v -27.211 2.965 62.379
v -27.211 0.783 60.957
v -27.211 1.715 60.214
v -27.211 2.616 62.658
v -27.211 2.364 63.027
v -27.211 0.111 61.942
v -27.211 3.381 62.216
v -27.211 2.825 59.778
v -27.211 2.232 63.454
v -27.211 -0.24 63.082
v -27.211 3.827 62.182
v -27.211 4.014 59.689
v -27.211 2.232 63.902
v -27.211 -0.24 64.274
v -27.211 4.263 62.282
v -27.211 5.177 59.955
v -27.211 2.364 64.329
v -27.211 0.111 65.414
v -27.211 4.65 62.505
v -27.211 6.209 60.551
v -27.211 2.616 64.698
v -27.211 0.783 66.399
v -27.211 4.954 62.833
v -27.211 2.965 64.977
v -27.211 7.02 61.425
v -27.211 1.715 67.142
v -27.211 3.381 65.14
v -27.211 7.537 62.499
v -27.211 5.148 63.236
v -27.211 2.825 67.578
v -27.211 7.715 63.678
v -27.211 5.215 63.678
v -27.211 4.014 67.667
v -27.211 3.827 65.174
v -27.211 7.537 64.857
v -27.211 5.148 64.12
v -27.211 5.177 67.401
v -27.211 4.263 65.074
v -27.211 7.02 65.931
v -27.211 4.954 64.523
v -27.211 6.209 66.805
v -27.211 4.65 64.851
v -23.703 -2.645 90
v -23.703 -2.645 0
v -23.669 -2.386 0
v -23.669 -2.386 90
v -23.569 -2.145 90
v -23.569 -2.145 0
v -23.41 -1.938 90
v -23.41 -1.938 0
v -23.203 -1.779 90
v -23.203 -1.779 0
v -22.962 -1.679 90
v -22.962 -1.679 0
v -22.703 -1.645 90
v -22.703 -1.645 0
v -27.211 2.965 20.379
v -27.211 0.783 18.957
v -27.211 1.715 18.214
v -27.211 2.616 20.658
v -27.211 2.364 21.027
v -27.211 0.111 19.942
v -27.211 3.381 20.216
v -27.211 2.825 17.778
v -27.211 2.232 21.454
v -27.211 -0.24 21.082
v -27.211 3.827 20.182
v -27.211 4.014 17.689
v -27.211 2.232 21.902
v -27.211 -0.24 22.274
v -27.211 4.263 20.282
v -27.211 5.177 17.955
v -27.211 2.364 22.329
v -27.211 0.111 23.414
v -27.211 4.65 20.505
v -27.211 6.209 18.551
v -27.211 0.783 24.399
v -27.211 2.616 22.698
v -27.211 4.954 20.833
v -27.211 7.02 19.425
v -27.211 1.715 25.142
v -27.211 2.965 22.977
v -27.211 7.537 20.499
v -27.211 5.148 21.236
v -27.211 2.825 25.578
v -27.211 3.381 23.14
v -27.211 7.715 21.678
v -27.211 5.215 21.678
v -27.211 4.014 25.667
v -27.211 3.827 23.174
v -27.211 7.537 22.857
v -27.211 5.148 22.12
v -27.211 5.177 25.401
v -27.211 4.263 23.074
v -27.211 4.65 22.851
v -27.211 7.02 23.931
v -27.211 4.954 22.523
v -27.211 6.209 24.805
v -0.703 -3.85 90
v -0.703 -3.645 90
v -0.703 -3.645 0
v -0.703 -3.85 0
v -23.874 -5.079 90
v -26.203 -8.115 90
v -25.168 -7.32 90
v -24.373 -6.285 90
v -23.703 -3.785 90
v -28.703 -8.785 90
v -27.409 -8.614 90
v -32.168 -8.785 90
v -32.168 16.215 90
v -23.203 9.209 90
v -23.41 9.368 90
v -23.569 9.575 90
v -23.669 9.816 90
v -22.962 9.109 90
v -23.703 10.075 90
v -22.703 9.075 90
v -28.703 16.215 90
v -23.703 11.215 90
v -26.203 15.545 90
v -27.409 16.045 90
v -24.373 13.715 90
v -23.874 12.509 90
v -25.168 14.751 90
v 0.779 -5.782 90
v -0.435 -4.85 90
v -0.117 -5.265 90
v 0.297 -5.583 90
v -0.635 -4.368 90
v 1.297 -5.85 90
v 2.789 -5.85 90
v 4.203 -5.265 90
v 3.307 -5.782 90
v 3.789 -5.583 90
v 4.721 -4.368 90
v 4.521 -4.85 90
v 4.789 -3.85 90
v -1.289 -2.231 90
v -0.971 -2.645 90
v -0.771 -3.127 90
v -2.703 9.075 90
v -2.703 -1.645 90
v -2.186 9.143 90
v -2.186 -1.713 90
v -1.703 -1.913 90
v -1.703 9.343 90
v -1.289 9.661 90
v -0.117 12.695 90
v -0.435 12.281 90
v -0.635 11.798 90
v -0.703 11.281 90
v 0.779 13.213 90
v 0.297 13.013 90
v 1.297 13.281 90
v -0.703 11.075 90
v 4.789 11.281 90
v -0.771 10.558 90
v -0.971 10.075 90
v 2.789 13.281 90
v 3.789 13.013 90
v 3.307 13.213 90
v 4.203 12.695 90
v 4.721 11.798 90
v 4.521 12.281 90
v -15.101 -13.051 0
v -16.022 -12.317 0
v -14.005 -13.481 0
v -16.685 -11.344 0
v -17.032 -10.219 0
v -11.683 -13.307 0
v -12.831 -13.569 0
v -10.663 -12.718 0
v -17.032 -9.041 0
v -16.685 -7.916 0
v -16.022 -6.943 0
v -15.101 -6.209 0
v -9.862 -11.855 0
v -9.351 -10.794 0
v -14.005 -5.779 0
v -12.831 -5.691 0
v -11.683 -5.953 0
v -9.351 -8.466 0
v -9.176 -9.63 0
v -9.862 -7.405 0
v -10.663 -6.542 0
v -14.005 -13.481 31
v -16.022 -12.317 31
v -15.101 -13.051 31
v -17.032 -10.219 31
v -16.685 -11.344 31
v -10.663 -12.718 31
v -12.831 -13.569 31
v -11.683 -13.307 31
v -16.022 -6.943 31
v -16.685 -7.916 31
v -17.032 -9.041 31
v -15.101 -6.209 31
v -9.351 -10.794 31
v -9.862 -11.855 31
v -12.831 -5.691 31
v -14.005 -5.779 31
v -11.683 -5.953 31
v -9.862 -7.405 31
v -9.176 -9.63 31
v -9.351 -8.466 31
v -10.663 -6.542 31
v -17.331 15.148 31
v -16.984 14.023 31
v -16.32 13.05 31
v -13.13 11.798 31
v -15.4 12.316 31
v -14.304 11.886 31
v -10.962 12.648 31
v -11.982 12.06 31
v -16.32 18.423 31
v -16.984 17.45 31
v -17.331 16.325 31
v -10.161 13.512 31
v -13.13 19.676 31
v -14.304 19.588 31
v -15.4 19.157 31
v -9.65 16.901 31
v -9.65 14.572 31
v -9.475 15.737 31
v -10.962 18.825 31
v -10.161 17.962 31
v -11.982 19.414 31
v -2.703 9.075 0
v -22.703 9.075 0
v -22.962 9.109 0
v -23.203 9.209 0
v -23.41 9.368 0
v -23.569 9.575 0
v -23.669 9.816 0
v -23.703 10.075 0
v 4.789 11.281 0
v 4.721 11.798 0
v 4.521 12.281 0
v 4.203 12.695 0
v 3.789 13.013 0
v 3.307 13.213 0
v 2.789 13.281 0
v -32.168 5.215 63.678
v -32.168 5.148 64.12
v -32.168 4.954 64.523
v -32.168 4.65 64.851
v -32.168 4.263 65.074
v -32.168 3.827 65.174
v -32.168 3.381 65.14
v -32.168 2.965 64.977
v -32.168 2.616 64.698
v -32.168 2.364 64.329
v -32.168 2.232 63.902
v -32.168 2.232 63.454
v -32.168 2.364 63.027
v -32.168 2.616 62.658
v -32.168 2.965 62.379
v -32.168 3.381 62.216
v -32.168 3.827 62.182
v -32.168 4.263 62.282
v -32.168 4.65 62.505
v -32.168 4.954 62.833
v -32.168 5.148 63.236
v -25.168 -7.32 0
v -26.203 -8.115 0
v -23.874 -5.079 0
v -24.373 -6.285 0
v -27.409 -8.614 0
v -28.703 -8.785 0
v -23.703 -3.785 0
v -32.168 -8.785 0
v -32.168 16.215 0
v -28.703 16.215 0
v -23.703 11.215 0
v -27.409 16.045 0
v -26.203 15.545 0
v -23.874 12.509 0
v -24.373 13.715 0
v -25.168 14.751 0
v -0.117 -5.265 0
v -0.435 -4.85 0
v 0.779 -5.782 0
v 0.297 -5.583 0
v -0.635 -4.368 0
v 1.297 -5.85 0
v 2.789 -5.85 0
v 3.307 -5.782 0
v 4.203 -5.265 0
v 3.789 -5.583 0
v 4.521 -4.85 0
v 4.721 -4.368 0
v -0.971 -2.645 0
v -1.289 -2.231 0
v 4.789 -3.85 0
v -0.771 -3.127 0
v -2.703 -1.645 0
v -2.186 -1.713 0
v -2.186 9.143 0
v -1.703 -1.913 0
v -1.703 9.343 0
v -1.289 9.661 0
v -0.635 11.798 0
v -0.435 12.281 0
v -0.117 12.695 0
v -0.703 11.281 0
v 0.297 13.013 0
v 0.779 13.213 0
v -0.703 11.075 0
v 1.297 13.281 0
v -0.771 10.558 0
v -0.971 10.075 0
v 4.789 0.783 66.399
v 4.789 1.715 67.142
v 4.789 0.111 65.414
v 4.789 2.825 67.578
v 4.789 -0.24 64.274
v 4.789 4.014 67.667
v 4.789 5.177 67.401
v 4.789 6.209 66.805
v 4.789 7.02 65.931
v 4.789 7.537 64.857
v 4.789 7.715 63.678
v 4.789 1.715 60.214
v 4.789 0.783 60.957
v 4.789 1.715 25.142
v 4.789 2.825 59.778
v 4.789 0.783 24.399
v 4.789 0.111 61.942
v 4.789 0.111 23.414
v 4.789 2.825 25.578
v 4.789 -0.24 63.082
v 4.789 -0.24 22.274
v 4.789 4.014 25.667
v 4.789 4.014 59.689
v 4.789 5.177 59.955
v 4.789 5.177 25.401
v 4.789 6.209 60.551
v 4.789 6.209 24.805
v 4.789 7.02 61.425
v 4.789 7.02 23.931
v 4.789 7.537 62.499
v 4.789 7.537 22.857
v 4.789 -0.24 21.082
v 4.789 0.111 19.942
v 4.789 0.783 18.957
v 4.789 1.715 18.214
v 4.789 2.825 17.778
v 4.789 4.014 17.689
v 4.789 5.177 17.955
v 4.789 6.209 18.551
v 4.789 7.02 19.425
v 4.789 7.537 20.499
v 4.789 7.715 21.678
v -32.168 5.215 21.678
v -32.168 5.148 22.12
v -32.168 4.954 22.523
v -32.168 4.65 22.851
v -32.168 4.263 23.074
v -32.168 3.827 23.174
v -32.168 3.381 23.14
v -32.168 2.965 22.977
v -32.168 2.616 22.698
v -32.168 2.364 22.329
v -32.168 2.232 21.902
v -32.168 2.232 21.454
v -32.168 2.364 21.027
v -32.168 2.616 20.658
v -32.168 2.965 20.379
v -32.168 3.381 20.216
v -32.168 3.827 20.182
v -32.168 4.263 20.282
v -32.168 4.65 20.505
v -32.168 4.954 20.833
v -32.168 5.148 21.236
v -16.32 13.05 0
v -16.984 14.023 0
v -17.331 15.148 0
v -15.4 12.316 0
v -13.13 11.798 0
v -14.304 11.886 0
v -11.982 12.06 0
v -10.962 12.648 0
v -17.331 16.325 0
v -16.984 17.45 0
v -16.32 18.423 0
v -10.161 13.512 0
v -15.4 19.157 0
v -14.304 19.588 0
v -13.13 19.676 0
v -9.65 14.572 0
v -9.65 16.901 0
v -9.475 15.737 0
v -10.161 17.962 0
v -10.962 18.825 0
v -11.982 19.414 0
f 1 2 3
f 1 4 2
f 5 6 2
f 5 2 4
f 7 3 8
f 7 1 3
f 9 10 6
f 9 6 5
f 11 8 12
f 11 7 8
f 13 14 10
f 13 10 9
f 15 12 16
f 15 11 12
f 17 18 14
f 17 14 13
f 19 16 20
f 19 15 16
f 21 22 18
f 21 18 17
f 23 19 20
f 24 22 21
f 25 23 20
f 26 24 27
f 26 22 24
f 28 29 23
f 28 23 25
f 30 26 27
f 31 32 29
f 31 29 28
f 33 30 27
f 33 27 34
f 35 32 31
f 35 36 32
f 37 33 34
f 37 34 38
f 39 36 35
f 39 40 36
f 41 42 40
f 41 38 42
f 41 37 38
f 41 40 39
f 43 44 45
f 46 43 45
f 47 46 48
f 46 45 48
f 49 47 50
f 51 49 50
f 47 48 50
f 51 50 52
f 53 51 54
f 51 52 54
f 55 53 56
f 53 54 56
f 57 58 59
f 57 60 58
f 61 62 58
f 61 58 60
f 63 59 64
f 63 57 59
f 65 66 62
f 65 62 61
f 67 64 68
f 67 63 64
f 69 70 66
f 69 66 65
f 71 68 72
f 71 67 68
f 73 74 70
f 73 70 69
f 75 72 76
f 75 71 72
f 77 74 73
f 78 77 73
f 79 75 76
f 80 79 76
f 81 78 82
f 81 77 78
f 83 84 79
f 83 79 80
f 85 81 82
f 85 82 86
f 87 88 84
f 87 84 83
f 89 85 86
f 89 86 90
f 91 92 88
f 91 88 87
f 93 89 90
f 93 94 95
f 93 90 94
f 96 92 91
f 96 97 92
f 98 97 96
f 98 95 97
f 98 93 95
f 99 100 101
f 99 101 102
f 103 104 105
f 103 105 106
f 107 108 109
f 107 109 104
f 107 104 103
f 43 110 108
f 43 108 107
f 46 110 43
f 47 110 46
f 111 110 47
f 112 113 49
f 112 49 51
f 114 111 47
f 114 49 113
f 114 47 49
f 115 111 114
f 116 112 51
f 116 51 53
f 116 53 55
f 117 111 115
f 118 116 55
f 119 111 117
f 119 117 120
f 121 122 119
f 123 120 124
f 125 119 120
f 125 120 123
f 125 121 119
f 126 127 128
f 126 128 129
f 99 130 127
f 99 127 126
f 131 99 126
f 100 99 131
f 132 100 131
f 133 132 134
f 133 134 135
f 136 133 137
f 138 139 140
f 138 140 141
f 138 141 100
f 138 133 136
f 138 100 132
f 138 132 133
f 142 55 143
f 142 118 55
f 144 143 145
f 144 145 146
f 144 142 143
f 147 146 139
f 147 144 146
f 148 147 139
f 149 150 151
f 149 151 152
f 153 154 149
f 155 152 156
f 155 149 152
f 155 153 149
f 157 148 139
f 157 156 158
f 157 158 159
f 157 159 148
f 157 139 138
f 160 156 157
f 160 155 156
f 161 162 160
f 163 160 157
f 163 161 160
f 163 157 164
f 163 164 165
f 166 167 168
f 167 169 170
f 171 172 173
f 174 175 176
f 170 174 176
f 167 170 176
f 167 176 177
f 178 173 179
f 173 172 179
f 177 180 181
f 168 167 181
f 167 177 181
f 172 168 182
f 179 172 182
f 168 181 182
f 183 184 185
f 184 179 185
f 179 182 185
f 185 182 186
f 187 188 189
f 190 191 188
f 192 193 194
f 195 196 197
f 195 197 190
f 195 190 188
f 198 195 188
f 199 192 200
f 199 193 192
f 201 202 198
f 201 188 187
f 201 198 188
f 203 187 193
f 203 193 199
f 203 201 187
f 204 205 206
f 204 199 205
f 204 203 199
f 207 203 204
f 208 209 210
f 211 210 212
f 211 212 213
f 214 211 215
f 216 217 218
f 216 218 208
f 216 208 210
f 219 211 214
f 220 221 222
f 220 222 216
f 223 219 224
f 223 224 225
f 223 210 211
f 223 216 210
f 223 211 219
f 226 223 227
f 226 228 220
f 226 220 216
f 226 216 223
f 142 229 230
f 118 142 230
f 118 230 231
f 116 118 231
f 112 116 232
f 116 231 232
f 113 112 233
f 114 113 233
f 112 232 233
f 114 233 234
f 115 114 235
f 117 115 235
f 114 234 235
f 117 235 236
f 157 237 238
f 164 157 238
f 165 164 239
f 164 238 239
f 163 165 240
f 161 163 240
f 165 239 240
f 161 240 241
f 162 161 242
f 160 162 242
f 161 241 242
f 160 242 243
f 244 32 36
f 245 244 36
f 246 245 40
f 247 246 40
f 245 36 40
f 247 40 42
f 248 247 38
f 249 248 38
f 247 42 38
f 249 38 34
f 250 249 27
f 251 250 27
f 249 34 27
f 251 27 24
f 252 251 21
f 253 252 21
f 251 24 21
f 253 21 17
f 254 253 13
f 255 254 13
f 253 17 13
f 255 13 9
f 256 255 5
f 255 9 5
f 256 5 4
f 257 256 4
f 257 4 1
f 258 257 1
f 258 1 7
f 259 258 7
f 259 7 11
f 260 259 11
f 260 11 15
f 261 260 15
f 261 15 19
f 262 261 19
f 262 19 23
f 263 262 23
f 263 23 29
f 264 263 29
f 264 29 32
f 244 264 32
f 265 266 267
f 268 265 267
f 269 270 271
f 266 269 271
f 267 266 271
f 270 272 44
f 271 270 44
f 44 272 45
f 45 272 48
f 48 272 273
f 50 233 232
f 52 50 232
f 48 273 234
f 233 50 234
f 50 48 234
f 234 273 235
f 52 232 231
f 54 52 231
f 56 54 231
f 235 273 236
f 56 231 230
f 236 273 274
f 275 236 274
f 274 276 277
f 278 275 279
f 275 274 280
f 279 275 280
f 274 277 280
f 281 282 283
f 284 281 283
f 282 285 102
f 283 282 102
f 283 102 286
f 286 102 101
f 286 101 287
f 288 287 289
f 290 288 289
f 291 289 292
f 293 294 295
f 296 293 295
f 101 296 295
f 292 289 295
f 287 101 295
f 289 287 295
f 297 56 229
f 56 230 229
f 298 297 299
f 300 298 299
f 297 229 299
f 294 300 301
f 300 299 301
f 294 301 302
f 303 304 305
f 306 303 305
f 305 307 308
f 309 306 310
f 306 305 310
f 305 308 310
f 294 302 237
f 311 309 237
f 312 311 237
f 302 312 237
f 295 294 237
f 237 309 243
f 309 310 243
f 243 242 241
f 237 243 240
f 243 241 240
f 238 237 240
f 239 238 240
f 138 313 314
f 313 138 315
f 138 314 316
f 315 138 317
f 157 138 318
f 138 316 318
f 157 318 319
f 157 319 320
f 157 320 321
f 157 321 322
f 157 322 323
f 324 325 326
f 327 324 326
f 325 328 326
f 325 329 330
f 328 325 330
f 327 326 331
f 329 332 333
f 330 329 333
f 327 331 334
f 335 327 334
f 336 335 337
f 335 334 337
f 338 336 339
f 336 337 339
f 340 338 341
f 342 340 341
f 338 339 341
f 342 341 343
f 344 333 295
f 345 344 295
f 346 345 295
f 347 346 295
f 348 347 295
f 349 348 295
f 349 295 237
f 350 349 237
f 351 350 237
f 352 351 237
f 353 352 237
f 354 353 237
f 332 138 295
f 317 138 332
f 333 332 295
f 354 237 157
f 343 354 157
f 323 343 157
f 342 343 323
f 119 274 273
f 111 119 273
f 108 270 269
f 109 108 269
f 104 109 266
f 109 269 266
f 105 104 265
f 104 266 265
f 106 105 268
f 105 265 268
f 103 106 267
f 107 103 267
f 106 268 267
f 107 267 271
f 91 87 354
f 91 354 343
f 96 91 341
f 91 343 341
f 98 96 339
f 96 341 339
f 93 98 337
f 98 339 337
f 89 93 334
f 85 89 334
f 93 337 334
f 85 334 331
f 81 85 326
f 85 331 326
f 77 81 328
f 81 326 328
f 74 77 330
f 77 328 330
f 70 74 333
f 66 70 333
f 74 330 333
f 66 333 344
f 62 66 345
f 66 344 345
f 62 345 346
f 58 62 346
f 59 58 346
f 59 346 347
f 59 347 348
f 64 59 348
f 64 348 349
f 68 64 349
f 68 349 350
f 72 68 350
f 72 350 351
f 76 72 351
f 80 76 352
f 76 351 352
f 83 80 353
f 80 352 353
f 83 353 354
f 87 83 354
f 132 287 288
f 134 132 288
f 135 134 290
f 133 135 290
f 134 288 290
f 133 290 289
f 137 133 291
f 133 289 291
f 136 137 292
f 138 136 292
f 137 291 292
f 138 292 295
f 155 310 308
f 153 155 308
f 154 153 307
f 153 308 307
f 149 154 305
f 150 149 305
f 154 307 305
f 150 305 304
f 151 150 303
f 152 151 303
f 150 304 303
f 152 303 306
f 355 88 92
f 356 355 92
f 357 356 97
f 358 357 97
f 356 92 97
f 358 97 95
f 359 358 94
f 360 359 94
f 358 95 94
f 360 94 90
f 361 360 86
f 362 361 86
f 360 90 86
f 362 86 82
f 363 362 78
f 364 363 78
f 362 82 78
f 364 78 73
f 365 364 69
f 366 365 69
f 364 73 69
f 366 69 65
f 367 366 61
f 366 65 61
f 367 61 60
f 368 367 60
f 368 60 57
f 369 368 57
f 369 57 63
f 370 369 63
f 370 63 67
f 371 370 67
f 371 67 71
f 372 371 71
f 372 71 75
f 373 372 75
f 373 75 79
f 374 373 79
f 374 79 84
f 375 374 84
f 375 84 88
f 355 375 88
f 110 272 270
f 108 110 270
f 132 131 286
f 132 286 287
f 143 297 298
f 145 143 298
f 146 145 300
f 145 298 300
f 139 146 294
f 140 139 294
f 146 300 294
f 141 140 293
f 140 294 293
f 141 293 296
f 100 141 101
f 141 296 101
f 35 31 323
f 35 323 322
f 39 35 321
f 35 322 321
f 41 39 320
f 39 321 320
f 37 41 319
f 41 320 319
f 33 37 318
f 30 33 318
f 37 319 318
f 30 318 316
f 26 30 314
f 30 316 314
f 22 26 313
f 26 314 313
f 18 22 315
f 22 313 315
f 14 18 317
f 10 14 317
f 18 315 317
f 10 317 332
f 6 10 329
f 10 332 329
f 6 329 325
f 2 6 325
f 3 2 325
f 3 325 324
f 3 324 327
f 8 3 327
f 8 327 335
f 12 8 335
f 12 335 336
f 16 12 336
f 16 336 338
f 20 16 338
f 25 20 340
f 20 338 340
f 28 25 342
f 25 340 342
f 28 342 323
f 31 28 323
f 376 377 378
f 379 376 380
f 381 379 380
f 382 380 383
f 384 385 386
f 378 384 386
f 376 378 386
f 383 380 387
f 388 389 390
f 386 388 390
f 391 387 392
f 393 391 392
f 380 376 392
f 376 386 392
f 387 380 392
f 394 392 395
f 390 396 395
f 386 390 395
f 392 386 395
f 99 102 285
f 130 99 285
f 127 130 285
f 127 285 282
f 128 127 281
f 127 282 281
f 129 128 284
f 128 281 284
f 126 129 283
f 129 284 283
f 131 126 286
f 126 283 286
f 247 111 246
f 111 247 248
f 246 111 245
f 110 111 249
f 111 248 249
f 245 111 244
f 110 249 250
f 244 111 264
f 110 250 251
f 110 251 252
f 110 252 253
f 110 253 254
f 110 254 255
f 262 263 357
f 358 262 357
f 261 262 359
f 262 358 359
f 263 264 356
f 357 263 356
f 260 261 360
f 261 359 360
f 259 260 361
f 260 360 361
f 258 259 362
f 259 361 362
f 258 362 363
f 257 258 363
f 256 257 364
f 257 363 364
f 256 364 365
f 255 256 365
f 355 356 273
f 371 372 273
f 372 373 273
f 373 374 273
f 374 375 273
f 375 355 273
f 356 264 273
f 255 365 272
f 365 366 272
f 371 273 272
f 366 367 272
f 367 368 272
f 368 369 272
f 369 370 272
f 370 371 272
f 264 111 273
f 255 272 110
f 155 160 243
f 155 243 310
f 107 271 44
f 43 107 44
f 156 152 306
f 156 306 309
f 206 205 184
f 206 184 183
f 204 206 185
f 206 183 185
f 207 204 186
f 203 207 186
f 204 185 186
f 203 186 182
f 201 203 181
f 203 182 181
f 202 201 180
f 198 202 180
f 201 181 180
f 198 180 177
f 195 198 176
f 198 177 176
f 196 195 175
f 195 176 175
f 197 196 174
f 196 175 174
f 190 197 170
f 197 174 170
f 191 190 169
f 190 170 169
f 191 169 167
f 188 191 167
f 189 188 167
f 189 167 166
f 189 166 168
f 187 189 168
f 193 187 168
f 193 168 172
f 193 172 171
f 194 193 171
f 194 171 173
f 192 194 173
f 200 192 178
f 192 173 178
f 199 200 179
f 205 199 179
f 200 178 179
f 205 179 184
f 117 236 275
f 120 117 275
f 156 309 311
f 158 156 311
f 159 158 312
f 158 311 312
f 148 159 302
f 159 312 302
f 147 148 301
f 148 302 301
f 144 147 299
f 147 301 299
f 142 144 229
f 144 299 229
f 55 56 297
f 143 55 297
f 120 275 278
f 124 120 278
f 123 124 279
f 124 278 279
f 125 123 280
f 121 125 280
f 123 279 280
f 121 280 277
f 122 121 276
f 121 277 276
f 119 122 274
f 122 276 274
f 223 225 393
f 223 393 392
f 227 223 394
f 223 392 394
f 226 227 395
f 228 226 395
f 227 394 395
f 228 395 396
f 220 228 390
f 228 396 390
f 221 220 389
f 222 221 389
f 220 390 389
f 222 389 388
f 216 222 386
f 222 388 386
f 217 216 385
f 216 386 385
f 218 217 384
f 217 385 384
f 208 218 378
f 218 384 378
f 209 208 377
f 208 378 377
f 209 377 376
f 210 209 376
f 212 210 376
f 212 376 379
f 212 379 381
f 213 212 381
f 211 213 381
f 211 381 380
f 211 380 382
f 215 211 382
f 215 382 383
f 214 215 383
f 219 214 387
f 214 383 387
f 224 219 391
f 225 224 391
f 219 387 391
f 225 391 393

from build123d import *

# Parameters (mm, degrees)
F1_DEPTH = 90
F2_DEPTH = 90
F3_R     = 1.5
F4_DEPTH = 54
F3_R_2   = 4
F5_DEPTH = 32
F6_R     = 3.95
F7_DEPTH = 31


with BuildPart() as f1:
    # F0 (on Top) → F1 (new body)
    with BuildSketch(Plane.XY):
        with BuildLine():
            Line((-32.1680851899, 16.2151374258), (-32.1680851899, -8.7848625742))
            Line((-32.1680851899, -8.7848625742), (-28.7031954581, -8.7848625742))
            ThreePointArc((-28.7031954581, -8.7848625742), (-25.1676615522, -7.3203964801), (-23.7031954581, -3.7848625742))
            Line((-23.7031954581, -3.7848625742), (-23.7031954581, -2.6450291778))
            ThreePointArc((-23.7031954581, -2.6450291778), (-23.4103022393, -1.9379223966), (-22.7031954581, -1.6450291778))
            Line((-22.7031954581, -1.6450291778), (-2.7031954581, -1.6450291778))
            ThreePointArc((-2.7031954581, -1.6450291778), (-1.2889818958, -2.2308156154), (-0.7031954581, -3.6450291778))
            Line((-0.7031954581, -3.6450291778), (-0.7031954581, -3.8504671592))
            ThreePointArc((-0.7031954581, -3.8504671592), (-0.1174090205, -5.2646807216), (1.2968045419, -5.8504671592))
            Line((1.2968045419, -5.8504671592), (2.7889119339, -5.8504671592))
            ThreePointArc((2.7889119339, -5.8504671592), (4.2031254963, -5.2646807216), (4.7889119339, -3.8504671592))
            Line((4.7889119339, -3.8504671592), (4.7889119339, 3.7151374258))
            Line((4.7889119339, 3.7151374258), (4.7889119339, 11.2807420108))
            ThreePointArc((4.7889119339, 11.2807420108), (4.2031254963, 12.6949555732), (2.7889119339, 13.2807420108))
            Line((2.7889119339, 13.2807420108), (1.2968045419, 13.2807420108))
            ThreePointArc((1.2968045419, 13.2807420108), (-0.1174090205, 12.6949555732), (-0.7031954581, 11.2807420108))
            Line((-0.7031954581, 11.2807420108), (-0.7031954581, 11.0753040294))
            ThreePointArc((-0.7031954581, 11.0753040294), (-1.2889818958, 9.661090467), (-2.7031954581, 9.0753040294))
            Line((-2.7031954581, 9.0753040294), (-22.7031954581, 9.0753040294))
            ThreePointArc((-22.7031954581, 9.0753040294), (-23.4103022393, 9.3681972482), (-23.7031954581, 10.0753040294))
            Line((-23.7031954581, 10.0753040294), (-23.7031954581, 11.2151374258))
            ThreePointArc((-23.7031954581, 11.2151374258), (-25.1676615522, 14.7506713317), (-28.7031954581, 16.2151374258))
            Line((-28.7031954581, 16.2151374258), (-32.1680851899, 16.2151374258))
        make_face()
    extrude(amount=F1_DEPTH)

    # F0 (on Top) → F2 (join)
    with BuildSketch(Plane.XY):
        with BuildLine():
            Line((-32.1680851899, 16.2151374258), (-32.1680851899, -8.7848625742))
            Line((-32.1680851899, -8.7848625742), (-28.7031954581, -8.7848625742))
            ThreePointArc((-28.7031954581, -8.7848625742), (-25.1676615522, -7.3203964801), (-23.7031954581, -3.7848625742))
            Line((-23.7031954581, -3.7848625742), (-23.7031954581, -2.6450291778))
            ThreePointArc((-23.7031954581, -2.6450291778), (-23.4103022393, -1.9379223966), (-22.7031954581, -1.6450291778))
            Line((-22.7031954581, -1.6450291778), (-2.7031954581, -1.6450291778))
            ThreePointArc((-2.7031954581, -1.6450291778), (-1.2889818958, -2.2308156154), (-0.7031954581, -3.6450291778))
            Line((-0.7031954581, -3.6450291778), (-0.7031954581, -3.8504671592))
            ThreePointArc((-0.7031954581, -3.8504671592), (-0.1174090205, -5.2646807216), (1.2968045419, -5.8504671592))
            Line((1.2968045419, -5.8504671592), (2.7889119339, -5.8504671592))
            ThreePointArc((2.7889119339, -5.8504671592), (4.2031254963, -5.2646807216), (4.7889119339, -3.8504671592))
            Line((4.7889119339, -3.8504671592), (4.7889119339, 3.7151374258))
            Line((4.7889119339, 3.7151374258), (4.7889119339, 11.2807420108))
            ThreePointArc((4.7889119339, 11.2807420108), (4.2031254963, 12.6949555732), (2.7889119339, 13.2807420108))
            Line((2.7889119339, 13.2807420108), (1.2968045419, 13.2807420108))
            ThreePointArc((1.2968045419, 13.2807420108), (-0.1174090205, 12.6949555732), (-0.7031954581, 11.2807420108))
            Line((-0.7031954581, 11.2807420108), (-0.7031954581, 11.0753040294))
            ThreePointArc((-0.7031954581, 11.0753040294), (-1.2889818958, 9.661090467), (-2.7031954581, 9.0753040294))
            Line((-2.7031954581, 9.0753040294), (-22.7031954581, 9.0753040294))
            ThreePointArc((-22.7031954581, 9.0753040294), (-23.4103022393, 9.3681972482), (-23.7031954581, 10.0753040294))
            Line((-23.7031954581, 10.0753040294), (-23.7031954581, 11.2151374258))
            ThreePointArc((-23.7031954581, 11.2151374258), (-25.1676615522, 14.7506713317), (-28.7031954581, 16.2151374258))
            Line((-28.7031954581, 16.2151374258), (-32.1680851899, 16.2151374258))
        make_face()
    extrude(amount=F2_DEPTH)

    # F3 (on face) → F4 (cut)
    with BuildSketch(Plane.YZ.offset(4.7889119339)):
        with Locations((3.7151374258, 63.6780038476)):
            Circle(F3_R)
        with Locations((3.7151374258, 21.6780038476)):
            Circle(F3_R)
    extrude(amount=-F4_DEPTH, mode=Mode.SUBTRACT)

    # F3 (on face) → F5 (cut)
    with BuildSketch(Plane.YZ.offset(4.7889119339)):
        with Locations((3.7151374258, 63.6780038476)):
            Circle(F3_R_2)
        with Locations((3.7151374258, 63.6780038476)):
            Circle(F3_R, mode=Mode.SUBTRACT)
        with Locations((3.7151374258, 21.6780038476)):
            Circle(F3_R_2)
        with Locations((3.7151374258, 21.6780038476)):
            Circle(F3_R, mode=Mode.SUBTRACT)
    extrude(amount=-F5_DEPTH, mode=Mode.SUBTRACT)


with BuildPart() as f7:
    # F6 (on Top) → F7 (new body)
    with BuildSketch(Plane.XY):
        with Locations((-13.424689777, 15.7366154087)):
            Circle(F6_R)
    extrude(amount=F7_DEPTH)


with BuildPart() as f7b:
    # F6 (on Top) → F7, piece 2 (new body)
    with BuildSketch(Plane.XY):
        with Locations((-13.1259629732, -9.630020947)):
            Circle(F6_R)
    extrude(amount=F7_DEPTH)


solid = Compound([f1.part, f7.part, f7b.part])
